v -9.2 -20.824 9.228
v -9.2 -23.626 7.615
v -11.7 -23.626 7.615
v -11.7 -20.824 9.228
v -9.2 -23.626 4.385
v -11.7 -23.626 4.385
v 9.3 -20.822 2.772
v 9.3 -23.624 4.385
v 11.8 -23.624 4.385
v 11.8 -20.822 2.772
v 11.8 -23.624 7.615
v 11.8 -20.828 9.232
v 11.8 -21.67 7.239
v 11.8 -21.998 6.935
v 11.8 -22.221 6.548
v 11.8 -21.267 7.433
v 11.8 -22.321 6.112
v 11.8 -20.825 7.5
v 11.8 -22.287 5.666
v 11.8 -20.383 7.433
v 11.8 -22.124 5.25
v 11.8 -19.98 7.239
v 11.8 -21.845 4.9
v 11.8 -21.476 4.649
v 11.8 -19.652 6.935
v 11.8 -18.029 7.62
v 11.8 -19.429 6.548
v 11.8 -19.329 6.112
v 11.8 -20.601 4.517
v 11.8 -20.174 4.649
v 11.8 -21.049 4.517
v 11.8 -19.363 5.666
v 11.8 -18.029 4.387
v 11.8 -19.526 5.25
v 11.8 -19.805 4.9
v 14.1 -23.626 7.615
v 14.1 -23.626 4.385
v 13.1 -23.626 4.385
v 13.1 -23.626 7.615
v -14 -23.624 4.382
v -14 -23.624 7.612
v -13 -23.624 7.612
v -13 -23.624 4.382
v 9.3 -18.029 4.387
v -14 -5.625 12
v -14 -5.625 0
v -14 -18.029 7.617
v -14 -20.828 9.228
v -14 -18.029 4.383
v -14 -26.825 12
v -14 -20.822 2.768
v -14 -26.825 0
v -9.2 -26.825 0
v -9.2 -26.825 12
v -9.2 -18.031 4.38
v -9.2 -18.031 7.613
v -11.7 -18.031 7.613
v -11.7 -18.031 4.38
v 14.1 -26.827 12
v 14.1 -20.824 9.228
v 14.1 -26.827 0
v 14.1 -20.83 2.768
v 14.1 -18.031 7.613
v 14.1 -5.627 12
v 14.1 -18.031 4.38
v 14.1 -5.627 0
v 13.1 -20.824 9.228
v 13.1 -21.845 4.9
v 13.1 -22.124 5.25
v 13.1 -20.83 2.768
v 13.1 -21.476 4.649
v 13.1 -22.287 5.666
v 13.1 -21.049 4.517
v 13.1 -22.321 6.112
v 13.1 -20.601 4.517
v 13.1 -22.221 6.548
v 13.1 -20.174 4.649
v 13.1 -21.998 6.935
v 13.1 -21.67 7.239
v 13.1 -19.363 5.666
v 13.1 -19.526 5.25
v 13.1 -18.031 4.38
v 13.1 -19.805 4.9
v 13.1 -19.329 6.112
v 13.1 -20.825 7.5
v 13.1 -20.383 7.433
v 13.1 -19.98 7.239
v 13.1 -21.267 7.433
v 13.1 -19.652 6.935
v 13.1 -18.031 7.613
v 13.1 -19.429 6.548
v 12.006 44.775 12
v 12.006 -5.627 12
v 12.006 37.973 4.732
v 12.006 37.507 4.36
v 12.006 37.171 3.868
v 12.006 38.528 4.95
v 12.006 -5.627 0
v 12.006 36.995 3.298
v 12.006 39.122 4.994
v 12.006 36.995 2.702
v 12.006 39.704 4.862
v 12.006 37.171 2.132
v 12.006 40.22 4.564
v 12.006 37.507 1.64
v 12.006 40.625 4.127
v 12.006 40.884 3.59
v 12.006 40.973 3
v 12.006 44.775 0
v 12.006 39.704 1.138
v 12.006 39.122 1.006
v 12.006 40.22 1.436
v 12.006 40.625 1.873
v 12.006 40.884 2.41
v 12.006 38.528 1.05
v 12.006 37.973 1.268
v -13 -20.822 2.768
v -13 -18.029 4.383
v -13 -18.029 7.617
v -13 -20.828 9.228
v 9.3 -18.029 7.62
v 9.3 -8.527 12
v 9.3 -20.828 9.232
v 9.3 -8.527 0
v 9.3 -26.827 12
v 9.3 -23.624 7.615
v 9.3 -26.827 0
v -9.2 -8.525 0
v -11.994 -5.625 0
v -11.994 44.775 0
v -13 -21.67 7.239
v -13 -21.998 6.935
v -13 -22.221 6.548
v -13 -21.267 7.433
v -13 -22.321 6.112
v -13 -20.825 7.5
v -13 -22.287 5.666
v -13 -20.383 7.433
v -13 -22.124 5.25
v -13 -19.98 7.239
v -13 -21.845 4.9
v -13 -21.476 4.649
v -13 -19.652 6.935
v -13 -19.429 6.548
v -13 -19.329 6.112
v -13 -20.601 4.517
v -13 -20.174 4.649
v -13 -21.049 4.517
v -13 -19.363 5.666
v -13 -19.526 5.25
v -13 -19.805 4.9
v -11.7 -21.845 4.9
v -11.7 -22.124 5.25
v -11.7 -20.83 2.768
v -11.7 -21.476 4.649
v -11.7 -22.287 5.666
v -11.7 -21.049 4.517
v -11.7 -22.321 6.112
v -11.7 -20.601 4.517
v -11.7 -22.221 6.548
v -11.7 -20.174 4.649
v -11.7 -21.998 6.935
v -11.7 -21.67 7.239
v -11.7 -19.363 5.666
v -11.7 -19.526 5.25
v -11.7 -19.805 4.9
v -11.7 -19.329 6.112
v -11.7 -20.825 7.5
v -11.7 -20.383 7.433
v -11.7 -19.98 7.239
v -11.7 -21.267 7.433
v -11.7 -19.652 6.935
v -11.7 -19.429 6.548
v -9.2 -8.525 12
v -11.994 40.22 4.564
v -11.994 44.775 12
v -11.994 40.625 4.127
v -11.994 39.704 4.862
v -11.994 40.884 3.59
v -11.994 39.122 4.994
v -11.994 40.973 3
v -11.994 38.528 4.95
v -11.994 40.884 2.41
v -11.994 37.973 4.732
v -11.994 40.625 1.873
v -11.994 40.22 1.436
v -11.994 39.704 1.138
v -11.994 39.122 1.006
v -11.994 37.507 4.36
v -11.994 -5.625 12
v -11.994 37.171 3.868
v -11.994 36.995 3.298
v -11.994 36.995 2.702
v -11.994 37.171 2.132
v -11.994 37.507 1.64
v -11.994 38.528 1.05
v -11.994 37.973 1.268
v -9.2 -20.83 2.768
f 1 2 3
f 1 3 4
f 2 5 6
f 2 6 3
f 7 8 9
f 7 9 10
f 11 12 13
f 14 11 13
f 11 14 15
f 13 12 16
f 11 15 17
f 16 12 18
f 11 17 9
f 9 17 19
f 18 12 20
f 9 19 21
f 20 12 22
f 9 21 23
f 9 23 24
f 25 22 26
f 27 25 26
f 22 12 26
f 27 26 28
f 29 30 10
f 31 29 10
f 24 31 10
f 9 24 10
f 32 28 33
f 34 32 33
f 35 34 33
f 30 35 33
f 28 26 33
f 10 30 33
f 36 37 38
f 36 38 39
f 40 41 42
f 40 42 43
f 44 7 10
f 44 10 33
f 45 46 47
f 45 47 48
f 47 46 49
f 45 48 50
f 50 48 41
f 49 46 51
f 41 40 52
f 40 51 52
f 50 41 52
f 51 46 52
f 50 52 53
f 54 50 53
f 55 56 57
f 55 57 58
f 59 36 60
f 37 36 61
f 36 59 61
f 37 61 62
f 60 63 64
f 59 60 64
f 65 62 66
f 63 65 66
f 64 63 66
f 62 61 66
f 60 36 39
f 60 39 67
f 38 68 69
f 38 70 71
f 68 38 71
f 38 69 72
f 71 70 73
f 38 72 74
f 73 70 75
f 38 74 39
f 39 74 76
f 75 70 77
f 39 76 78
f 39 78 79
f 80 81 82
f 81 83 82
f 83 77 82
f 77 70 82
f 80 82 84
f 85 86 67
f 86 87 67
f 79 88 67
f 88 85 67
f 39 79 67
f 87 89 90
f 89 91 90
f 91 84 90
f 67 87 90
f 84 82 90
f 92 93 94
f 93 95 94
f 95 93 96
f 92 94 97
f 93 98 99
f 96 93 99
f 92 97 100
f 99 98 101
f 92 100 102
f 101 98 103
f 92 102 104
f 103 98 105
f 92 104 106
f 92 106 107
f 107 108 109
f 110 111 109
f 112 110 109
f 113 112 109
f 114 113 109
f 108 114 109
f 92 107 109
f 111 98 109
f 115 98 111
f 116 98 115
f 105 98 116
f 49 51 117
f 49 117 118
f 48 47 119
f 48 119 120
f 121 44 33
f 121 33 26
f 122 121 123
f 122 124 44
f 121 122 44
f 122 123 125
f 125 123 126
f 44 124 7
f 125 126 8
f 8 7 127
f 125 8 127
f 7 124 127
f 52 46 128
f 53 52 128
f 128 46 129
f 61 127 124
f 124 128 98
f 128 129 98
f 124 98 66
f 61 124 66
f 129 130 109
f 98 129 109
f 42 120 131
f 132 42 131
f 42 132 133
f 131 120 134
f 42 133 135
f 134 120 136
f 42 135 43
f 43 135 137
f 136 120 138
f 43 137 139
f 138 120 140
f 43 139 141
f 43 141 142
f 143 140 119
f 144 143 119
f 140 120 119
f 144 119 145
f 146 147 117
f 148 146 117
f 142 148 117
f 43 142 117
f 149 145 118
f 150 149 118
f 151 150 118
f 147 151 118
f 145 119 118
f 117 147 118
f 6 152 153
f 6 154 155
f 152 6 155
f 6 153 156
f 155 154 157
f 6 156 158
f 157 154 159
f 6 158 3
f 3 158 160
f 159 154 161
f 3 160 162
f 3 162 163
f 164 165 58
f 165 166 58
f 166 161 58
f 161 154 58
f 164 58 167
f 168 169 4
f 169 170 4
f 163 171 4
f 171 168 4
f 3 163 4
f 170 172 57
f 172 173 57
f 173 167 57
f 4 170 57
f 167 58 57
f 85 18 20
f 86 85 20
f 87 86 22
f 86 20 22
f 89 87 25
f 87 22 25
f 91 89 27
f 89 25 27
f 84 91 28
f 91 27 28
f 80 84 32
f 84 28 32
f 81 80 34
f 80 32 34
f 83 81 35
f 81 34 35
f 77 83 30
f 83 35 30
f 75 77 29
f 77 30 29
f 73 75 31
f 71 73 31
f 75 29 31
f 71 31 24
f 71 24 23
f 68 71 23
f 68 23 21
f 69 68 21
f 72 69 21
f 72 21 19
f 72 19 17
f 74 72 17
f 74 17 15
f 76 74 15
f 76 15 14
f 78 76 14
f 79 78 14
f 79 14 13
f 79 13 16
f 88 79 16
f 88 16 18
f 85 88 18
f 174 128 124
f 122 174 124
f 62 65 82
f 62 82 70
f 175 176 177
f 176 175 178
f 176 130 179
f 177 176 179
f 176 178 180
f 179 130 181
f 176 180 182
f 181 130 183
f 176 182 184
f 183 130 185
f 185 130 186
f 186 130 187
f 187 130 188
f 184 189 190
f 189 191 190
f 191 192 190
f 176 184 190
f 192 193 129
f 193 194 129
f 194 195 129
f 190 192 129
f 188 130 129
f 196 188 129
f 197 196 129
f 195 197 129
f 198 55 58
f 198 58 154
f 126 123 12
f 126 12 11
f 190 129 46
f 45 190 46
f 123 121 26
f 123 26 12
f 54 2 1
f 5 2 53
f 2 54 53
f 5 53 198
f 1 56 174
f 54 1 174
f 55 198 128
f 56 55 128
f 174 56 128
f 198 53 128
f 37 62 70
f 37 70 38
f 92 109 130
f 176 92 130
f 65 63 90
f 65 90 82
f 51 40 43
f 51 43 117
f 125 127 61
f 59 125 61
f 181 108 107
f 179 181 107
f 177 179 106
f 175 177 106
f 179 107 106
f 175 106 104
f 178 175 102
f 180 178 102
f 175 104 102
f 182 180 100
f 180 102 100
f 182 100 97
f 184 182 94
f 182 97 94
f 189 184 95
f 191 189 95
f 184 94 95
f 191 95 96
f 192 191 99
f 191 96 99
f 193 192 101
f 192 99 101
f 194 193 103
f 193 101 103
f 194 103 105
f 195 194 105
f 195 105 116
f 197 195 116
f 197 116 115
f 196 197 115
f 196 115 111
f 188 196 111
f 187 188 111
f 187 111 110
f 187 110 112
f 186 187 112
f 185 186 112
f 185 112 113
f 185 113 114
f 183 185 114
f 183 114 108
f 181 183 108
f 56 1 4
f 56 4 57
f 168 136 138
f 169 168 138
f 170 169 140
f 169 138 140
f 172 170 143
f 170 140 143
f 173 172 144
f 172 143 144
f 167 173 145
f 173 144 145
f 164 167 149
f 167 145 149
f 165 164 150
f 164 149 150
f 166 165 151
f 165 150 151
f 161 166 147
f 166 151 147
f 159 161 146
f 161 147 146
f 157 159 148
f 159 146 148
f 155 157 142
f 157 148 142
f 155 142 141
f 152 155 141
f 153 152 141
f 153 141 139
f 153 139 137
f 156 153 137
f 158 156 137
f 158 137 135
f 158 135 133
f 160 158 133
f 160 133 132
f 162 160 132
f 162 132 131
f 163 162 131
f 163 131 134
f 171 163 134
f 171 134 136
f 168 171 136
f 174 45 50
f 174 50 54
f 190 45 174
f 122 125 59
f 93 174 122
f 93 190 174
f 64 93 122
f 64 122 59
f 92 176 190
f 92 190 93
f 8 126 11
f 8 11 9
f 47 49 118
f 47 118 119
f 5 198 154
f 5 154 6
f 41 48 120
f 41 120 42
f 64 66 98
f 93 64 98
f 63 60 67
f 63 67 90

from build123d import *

# Parameters (mm, degrees)
EXTRUDE_1_DEPTH      = 12
CUT_EXTRUDE_12_DEPTH = 1
CUT_EXTRUDE_13_DEPTH = 1
CUT_EXTRUDE_14_DEPTH = 2.5
CUT_EXTRUDE_16_DEPTH = 2.5
SKETCH_26_R          = 1.5
CUT_EXTRUDE_17_DEPTH = 54.695511127
SKETCH_27_R          = 2
CUT_EXTRUDE_18_DEPTH = 54.151469748


with BuildPart() as part:
    # 스케치1 → 보스-돌출1 (new body)
    with BuildSketch(Plane.XY):
        Polygon((-11.994395335, 44.774969809), (-11.994395335, -5.625030191), (-13.999795062, -5.625030191), (-13.999795062, -26.825030191), (-9.199795062, -26.825030191), (-9.199795062, -8.525030191), (9.300204823, -8.527085749), (9.300204823, -26.827085749), (14.100204823, -26.827085749), (14.100204823, -5.627085749), (12.005604665, -5.627085749), (12.005604665, 44.774969809), align=None)
    extrude(amount=EXTRUDE_1_DEPTH)

    # 스케치20 → 컷-돌출12 (cut)
    with BuildSketch(Plane(origin=(14.100204823, 0, 0), x_dir=(0, 0, -1), z_dir=(1, 0, 0))):
        Polygon((-4.384999641, -23.626174282), (-7.614999641, -23.626174282), (-9.228415158, -20.82434965), (-7.61341897, -18.03073805), (-4.380259285, -18.03073805), (-2.768420518, -20.829824529), align=None)
    extrude(amount=-CUT_EXTRUDE_12_DEPTH, mode=Mode.SUBTRACT)

    # 스케치21 → 컷-돌출13 (cut)
    with BuildSketch(Plane.ZY.offset(13.999795062)):
        Polygon((7.611839128, -23.624116045), (4.381839128, -23.624116045), (2.768423611, -20.822291413), (4.383419799, -18.028679813), (7.616579484, -18.028679813), (9.228418251, -20.827766292), align=None)
    extrude(amount=-CUT_EXTRUDE_13_DEPTH, mode=Mode.SUBTRACT)

    # 스케치22 → 컷-돌출14 (cut)
    with BuildSketch(Plane.ZY.offset(-9.300204823)):
        Polygon((7.615000359, -23.624118724), (4.385000359, -23.624118724), (2.771584842, -20.822294093), (4.38658103, -18.028682492), (7.619740715, -18.028682492), (9.231579482, -20.827768971), align=None)
    extrude(amount=-CUT_EXTRUDE_14_DEPTH, mode=Mode.SUBTRACT)

    # 스케치25 → 컷-돌출16 (cut)
    with BuildSketch(Plane(origin=(-9.199795062, 0, 0), x_dir=(0, 0, -1), z_dir=(1, 0, 0))):
        Polygon((-4.384999641, -23.626174282), (-7.614999641, -23.626174282), (-9.228415158, -20.82434965), (-7.61341897, -18.03073805), (-4.380259285, -18.03073805), (-2.768420518, -20.829824529), align=None)
    extrude(amount=-CUT_EXTRUDE_16_DEPTH, mode=Mode.SUBTRACT)

    # 스케치26 → 컷-돌출17 (cut, through all)
    with BuildSketch(Plane.ZY.offset(12.999795062)):
        with Locations((6, -20.825030191)):
            Circle(SKETCH_26_R)
    extrude(amount=-CUT_EXTRUDE_17_DEPTH, mode=Mode.SUBTRACT)

    # 스케치27 → 컷-돌출18 (cut, through all)
    with BuildSketch(Plane(origin=(12.005604665, 0, 0), x_dir=(0, 0, -1), z_dir=(1, 0, 0))):
        with Locations(Location((-3, 38.972914251, 0), (0, 0, 90))):
            Circle(SKETCH_27_R)
    extrude(amount=-CUT_EXTRUDE_18_DEPTH, mode=Mode.SUBTRACT)


solid = part.part
